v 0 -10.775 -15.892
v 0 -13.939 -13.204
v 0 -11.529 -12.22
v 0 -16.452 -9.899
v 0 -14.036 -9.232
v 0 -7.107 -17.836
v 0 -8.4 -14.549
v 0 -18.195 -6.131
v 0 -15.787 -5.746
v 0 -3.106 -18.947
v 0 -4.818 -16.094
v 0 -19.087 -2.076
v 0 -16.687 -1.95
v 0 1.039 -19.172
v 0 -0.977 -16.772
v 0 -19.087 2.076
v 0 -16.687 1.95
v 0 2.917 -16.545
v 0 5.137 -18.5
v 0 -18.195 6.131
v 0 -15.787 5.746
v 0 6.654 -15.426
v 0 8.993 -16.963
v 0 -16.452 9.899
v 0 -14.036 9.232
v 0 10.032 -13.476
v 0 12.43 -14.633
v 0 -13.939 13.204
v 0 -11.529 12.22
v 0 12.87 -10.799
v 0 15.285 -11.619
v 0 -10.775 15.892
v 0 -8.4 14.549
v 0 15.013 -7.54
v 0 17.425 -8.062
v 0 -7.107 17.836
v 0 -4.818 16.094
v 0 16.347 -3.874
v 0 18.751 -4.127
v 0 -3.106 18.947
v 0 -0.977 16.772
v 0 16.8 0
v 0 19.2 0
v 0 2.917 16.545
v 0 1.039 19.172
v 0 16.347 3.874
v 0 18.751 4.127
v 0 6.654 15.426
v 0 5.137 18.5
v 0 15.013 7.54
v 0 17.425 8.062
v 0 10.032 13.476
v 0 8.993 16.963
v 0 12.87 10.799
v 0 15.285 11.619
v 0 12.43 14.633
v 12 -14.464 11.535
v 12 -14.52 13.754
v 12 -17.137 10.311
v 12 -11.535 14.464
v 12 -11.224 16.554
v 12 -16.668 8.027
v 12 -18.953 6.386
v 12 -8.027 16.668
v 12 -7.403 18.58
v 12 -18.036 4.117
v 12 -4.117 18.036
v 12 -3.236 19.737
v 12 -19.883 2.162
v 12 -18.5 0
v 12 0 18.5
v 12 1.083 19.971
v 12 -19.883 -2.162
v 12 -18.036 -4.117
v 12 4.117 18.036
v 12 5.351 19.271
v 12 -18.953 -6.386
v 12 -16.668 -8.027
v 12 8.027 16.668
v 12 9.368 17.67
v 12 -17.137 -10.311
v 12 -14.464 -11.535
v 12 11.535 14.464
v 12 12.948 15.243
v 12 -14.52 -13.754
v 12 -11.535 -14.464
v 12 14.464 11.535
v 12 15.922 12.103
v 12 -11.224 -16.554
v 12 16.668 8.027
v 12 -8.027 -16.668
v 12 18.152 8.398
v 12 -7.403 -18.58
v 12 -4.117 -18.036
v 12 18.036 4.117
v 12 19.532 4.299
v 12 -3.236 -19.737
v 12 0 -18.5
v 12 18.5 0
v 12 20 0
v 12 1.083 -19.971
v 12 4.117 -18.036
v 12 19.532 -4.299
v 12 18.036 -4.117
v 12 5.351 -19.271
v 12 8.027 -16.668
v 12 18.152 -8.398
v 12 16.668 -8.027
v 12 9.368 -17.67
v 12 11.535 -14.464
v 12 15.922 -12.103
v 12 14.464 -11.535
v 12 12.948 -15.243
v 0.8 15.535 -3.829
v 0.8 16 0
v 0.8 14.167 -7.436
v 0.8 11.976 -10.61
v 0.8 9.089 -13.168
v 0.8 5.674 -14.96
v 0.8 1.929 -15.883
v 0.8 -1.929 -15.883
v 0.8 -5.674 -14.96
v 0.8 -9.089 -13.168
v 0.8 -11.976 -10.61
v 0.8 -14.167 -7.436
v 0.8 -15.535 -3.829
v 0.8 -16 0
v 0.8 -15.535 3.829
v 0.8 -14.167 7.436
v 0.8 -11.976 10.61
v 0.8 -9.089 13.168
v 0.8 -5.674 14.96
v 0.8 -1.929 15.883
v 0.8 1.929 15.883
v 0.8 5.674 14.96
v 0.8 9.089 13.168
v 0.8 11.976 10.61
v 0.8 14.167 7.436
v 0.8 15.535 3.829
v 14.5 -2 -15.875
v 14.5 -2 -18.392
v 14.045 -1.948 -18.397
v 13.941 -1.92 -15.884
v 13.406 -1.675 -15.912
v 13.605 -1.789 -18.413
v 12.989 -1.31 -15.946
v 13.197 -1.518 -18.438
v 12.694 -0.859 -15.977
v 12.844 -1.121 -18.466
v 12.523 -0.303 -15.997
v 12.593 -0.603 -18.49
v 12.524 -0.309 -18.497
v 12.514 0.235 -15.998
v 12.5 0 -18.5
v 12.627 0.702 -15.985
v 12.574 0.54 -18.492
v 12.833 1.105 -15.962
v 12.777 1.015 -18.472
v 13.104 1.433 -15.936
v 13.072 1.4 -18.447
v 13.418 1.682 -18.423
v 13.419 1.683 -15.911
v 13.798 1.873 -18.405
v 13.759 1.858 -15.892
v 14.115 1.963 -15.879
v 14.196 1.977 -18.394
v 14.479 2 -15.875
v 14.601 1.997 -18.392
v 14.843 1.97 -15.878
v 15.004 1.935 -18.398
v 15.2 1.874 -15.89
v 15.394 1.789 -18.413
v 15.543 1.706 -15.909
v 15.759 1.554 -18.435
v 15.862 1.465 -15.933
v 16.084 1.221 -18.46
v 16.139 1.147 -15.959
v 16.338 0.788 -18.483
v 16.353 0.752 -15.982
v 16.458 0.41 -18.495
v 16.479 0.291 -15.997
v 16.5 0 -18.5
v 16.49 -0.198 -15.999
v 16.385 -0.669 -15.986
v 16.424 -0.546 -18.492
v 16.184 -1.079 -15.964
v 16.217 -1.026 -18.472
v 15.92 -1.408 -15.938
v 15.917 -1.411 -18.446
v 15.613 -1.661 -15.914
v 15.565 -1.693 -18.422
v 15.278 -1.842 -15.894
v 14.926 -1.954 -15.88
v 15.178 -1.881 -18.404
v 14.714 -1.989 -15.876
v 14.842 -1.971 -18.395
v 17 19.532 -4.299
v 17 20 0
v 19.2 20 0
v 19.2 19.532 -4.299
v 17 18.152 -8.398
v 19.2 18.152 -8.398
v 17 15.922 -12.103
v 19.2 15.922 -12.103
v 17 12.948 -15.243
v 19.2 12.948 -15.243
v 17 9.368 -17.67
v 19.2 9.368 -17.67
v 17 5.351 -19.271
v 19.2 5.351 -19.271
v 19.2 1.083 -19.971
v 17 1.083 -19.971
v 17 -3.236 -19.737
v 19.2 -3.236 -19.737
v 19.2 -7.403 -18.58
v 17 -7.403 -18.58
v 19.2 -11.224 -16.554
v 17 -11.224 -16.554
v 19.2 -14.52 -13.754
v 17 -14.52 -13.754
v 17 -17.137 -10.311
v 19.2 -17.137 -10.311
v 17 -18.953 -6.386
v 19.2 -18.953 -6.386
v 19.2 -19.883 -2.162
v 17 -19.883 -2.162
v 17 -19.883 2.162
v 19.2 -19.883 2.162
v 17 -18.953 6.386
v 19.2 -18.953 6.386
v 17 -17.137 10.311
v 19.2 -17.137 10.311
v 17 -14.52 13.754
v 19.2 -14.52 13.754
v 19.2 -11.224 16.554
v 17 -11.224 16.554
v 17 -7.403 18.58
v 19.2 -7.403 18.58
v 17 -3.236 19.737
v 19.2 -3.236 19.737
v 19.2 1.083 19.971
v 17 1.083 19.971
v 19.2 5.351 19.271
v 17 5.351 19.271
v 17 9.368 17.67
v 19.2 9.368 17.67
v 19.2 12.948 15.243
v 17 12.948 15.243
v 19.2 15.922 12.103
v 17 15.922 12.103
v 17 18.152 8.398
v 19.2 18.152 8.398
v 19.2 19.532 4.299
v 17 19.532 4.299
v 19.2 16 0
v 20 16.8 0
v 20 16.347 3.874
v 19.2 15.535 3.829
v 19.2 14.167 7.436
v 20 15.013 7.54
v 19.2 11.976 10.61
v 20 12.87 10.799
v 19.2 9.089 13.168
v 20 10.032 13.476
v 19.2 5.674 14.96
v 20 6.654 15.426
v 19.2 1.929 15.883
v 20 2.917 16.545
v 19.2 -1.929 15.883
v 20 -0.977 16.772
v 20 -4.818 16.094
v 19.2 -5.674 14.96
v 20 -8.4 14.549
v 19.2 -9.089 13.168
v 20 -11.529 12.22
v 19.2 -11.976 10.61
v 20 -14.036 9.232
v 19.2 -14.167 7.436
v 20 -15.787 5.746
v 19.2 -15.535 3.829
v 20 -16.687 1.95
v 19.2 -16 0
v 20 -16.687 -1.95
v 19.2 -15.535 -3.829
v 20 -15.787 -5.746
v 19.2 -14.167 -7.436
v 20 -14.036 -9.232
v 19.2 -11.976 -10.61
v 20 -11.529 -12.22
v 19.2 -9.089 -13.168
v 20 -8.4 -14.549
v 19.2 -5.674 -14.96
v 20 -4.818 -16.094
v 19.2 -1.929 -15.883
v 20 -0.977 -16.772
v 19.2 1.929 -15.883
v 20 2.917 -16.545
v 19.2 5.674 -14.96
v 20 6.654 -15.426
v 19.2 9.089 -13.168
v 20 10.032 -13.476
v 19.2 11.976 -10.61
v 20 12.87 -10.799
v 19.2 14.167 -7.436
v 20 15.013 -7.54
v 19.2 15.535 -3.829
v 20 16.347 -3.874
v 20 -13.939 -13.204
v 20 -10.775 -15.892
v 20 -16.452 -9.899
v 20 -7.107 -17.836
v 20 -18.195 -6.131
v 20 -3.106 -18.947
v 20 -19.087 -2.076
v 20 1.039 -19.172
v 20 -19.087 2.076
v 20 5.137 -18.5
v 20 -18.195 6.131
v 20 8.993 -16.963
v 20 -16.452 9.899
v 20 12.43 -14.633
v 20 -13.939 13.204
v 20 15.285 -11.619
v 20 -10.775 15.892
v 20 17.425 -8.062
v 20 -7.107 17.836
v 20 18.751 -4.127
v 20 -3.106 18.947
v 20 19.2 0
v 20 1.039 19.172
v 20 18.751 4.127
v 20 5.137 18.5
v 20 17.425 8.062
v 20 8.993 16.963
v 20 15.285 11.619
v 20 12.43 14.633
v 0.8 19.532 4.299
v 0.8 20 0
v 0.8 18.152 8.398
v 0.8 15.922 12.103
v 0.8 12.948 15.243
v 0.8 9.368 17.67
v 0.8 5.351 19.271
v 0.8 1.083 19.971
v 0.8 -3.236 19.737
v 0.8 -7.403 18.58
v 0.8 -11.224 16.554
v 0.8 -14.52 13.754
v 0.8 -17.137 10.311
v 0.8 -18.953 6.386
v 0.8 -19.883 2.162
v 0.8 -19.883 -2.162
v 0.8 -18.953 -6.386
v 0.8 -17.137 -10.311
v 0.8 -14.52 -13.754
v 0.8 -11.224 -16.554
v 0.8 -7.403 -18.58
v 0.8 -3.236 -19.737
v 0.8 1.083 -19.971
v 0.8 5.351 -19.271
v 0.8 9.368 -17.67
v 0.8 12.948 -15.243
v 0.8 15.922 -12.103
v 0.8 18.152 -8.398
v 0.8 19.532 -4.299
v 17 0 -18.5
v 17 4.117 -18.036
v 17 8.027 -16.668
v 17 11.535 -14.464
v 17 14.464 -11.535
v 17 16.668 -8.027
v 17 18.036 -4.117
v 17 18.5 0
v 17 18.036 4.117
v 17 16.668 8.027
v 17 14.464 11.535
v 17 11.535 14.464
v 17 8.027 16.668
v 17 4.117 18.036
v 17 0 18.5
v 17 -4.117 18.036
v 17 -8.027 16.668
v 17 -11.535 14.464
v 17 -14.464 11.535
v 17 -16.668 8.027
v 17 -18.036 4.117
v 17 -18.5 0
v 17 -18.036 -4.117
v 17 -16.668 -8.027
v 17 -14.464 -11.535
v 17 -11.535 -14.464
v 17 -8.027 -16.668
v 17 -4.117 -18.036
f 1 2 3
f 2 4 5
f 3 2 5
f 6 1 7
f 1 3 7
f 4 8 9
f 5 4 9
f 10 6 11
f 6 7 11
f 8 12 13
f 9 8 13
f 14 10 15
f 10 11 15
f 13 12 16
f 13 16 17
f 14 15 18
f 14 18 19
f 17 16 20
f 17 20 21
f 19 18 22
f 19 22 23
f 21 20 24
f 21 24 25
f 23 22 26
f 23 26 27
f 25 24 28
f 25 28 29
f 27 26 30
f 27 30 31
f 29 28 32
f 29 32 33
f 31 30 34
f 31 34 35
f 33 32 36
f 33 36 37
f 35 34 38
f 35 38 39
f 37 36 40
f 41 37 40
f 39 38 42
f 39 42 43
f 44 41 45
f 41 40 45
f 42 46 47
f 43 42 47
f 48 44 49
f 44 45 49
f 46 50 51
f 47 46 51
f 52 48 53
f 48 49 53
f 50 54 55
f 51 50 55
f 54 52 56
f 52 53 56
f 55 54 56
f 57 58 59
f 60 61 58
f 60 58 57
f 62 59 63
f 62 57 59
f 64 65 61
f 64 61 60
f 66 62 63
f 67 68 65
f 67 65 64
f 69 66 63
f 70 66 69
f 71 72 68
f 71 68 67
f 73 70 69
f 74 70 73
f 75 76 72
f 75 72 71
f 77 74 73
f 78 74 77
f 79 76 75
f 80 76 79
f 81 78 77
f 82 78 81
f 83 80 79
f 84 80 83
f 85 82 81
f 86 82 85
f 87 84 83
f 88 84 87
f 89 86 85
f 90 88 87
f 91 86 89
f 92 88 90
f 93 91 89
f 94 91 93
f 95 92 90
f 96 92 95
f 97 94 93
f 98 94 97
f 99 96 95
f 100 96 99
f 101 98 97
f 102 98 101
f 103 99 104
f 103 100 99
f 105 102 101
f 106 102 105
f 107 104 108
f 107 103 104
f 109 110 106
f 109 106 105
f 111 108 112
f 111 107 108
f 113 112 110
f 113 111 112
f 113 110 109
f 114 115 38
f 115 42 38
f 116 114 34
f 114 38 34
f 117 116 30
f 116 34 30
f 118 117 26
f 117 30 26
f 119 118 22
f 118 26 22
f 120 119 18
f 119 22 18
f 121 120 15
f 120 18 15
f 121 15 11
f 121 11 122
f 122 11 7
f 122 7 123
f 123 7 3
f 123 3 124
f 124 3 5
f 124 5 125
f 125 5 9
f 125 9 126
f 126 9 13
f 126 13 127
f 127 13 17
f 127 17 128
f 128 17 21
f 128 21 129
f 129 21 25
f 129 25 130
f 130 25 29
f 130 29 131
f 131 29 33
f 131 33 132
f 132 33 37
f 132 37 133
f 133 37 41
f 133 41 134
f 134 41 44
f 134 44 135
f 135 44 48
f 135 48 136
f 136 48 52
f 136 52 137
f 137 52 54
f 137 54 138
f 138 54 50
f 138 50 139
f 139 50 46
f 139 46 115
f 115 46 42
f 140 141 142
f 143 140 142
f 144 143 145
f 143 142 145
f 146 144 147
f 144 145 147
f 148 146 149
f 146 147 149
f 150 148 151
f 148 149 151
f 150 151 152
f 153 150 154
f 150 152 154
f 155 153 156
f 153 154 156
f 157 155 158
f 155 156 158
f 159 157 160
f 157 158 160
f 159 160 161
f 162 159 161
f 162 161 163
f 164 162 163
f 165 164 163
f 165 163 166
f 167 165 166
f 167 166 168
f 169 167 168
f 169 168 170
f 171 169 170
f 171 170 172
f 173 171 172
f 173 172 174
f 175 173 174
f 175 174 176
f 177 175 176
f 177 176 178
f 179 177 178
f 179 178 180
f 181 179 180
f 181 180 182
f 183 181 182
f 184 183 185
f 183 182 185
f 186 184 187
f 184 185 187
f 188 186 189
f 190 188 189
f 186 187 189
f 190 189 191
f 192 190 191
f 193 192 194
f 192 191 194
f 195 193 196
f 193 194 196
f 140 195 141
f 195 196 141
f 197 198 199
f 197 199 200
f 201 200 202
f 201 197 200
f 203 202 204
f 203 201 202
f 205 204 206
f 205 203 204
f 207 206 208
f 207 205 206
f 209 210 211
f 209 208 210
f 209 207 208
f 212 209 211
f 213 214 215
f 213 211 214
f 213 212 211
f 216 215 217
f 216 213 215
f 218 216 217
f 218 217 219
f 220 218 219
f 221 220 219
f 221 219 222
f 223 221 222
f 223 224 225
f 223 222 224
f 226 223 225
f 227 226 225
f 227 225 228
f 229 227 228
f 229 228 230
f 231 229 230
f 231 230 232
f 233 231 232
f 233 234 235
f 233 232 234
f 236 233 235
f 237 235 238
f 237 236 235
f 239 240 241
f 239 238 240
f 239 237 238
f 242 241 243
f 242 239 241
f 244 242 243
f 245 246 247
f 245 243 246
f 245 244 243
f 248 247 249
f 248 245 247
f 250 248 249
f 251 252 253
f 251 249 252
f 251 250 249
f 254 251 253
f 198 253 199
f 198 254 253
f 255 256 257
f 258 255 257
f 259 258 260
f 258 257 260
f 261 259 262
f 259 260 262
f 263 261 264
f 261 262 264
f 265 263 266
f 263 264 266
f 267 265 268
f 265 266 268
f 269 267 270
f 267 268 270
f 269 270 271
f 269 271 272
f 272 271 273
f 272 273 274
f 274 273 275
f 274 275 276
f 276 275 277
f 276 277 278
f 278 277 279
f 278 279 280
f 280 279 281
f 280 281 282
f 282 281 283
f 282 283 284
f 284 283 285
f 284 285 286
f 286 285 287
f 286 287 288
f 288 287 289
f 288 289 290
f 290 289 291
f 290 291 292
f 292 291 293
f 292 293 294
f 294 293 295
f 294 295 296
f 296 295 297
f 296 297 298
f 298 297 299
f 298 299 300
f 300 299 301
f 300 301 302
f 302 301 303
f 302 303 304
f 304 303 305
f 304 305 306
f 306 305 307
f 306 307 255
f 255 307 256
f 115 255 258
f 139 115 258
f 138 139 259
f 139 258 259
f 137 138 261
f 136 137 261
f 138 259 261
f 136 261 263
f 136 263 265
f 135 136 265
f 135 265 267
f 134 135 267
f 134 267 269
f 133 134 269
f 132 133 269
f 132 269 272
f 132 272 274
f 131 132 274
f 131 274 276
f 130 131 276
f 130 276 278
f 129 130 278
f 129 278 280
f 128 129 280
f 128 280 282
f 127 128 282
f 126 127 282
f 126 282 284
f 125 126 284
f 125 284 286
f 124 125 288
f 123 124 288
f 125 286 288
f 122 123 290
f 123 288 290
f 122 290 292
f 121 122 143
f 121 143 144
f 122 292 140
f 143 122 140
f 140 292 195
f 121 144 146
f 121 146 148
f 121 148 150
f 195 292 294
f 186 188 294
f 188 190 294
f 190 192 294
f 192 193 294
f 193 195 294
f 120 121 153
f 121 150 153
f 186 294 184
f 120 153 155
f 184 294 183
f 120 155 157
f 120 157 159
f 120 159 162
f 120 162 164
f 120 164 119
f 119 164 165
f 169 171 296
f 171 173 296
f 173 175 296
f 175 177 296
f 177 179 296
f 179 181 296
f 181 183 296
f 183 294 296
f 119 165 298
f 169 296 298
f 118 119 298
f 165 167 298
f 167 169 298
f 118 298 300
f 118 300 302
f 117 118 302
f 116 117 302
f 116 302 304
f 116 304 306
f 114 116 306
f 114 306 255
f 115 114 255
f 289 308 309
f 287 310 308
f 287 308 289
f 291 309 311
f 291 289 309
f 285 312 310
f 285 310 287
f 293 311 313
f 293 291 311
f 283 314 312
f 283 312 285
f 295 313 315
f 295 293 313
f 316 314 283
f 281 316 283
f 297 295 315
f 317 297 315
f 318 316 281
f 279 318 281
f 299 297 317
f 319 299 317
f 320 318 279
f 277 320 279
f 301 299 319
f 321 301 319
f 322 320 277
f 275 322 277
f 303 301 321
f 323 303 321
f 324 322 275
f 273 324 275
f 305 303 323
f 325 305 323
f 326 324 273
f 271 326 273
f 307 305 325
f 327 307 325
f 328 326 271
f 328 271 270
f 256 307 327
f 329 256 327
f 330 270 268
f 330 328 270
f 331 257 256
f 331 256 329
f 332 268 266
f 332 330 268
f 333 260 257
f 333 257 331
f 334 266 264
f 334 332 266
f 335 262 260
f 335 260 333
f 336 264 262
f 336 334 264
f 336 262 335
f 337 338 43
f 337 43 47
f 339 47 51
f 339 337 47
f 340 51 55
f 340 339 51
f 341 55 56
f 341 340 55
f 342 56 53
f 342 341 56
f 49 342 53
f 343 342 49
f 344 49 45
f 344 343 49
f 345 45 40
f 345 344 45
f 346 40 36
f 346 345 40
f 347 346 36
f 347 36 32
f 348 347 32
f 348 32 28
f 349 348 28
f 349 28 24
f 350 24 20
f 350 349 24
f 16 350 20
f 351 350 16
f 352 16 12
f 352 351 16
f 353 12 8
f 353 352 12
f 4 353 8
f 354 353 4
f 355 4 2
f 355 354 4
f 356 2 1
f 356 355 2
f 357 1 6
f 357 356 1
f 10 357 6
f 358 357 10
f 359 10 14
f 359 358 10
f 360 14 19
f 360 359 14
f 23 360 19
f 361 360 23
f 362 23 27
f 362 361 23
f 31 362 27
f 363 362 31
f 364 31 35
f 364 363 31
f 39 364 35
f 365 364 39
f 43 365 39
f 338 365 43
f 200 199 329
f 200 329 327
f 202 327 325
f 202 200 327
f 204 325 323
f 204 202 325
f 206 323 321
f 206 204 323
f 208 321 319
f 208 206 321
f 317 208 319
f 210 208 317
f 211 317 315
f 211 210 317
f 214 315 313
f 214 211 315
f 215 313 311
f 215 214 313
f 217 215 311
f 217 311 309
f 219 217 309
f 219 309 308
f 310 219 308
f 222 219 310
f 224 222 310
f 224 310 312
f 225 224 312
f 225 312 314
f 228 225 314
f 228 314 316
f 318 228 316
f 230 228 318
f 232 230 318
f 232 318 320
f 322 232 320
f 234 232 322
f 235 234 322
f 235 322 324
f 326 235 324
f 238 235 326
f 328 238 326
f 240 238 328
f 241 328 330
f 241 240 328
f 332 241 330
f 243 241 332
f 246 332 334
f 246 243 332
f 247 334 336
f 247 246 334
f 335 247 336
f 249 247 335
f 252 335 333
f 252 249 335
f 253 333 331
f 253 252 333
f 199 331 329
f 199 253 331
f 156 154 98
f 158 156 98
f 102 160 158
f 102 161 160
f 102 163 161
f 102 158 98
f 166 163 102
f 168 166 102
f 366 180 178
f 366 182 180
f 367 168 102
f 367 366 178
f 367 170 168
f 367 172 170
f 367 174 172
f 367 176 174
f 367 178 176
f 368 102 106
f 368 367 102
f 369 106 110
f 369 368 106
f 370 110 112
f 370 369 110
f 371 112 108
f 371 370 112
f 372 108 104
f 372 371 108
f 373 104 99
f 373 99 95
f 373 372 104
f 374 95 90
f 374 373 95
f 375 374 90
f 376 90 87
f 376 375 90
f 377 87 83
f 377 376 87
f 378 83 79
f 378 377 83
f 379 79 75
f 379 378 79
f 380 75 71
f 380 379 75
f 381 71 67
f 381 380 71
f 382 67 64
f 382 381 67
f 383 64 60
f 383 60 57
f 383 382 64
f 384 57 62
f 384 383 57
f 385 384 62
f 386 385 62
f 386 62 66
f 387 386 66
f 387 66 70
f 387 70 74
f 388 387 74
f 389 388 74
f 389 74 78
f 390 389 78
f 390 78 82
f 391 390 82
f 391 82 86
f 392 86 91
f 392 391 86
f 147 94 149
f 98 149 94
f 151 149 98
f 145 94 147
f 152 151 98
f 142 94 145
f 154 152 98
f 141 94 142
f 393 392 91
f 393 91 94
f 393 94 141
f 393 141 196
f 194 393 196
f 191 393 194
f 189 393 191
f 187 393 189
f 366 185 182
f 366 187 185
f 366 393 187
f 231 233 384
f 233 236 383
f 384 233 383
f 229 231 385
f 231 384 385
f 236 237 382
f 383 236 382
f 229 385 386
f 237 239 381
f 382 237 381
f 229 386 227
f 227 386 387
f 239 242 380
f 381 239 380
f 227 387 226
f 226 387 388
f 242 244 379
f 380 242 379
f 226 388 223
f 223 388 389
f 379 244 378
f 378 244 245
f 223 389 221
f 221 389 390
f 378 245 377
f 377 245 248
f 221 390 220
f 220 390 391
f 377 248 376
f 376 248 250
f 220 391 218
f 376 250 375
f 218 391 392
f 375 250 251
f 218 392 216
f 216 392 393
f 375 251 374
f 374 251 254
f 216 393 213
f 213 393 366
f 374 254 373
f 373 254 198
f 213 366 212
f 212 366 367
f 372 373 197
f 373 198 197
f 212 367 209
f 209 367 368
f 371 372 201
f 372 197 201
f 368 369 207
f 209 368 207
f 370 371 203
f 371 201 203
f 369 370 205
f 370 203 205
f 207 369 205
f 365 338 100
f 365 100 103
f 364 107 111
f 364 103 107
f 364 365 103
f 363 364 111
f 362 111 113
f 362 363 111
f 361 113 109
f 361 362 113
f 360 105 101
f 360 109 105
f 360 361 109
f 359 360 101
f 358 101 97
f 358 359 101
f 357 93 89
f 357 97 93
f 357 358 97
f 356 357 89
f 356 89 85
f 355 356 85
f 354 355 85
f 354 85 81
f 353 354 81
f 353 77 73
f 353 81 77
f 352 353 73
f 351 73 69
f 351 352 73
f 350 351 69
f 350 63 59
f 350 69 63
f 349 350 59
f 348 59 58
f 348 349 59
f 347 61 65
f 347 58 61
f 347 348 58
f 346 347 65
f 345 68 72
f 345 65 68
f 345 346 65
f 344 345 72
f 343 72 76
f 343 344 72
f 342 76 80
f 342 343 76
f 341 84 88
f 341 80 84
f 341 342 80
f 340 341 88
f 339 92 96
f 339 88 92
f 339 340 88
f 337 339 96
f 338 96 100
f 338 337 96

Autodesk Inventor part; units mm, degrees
ref_plane "YZ Plane" through (0, 0, 0) normal (1, 0, 0) x (0, 1, 0)
ref_plane "XZ Plane" through (0, 0, 0) normal (0, 1, 0) x (-1, 0, 0)
sketch "Skizze" plane through (0, 0, 0) normal (0, 0, 1) x (1, 0, 0)
  line L0 (0, 0) -> (20, 0)
  line L1 (0, 0) -> (0, 16) construction
  line L2 (0, 16) -> (20, 16)
  line L3 (20, 16) -> (20, 20)
  line L4 (20, 20) -> (0, 20)
  line L5 (0, 20) -> (0, 16)
  dimension "d0" = 32
  dimension "d1" = 40
  dimension "d2" = 20
revolve "Körper" add sketch "Skizze" angle 360 about axis through (0, 0, 0) along (1, 0, 0)
chamfer "Fase1" distance 0.8001 distance2 0.8001 1 edges at (0, -20, 0) measured on face at (0, 18.318, -2.8718)
chamfer "Fase2" distance 0.8001 distance2 0.8001 1 edges at (0, -16, 0) measured on face at (0, 17.7923, -2.808)
chamfer "Fase3" distance 0.8001 distance2 0.8001 1 edges at (20, -16, 0) measured on face at (20, 18.4729, -1.5954)
chamfer "Fase4" distance 0.8001 distance2 0.8001 1 edges at (20, -20, 0) measured on face at (20, 18.7396, -1.5954)
ref_plane "Arbeitsebene1" through (17, 0, 0) normal (1, 0, 0) x (0, 0, -1)
sketch "Skizze2" plane through (17, 0, 0) normal (1, 0, 0) x (0, 0, -1)
  circle A0 centre (0, 0) radius 20
  circle A1 centre (0, 0) radius 18.5
  dimension "d22" = 1.5
  dimension "d23" = 40
extrude "Extrusion1" cut sketch "Skizze2" against normal blind 5
sketch "Skizze3" plane through (0, 0, 0) normal (0, 0, 1) x (1, 0, 0)
  line L0 (12, 20) -> (12, -20) projected
  line L1 (-4, 0) -> (24, 0) projected
  point P0 (0, 0)
  point P1 (14.5, 0)
  dimension "d26" = 2.5
hole "Bohrung1" at (14.5, 0, 0) direction (0, 0, -1) diameter 4 depth 35 tip angle 118
equation "\"d0\" = WD"
equation "\"d1\" = BD"
equation "\"d2\" = KB"
equation "\"WD\" = 32"
equation "\"BD\" = 40"
equation "\"KB\" = 20"
equation "\"PHH1\" = 0.8"
equation "\"KID1\" = 33.6"
equation "\"KAD1\" = 38.4"
equation "\"PHH2\" = PHH1"
equation "\"PHH3\" = PHH1"
equation "\"PHH4\" = PHH1"
equation "\"KID2\" = KID1"
equation "\"KAD2\" = KAD1"
equation "\"WR\" = 0.5 * WD"
equation "\"BBA\" = 0"
properties part number "ISO 4379 - 32 x 40 x 20" material "Kupfer, Legierung"
